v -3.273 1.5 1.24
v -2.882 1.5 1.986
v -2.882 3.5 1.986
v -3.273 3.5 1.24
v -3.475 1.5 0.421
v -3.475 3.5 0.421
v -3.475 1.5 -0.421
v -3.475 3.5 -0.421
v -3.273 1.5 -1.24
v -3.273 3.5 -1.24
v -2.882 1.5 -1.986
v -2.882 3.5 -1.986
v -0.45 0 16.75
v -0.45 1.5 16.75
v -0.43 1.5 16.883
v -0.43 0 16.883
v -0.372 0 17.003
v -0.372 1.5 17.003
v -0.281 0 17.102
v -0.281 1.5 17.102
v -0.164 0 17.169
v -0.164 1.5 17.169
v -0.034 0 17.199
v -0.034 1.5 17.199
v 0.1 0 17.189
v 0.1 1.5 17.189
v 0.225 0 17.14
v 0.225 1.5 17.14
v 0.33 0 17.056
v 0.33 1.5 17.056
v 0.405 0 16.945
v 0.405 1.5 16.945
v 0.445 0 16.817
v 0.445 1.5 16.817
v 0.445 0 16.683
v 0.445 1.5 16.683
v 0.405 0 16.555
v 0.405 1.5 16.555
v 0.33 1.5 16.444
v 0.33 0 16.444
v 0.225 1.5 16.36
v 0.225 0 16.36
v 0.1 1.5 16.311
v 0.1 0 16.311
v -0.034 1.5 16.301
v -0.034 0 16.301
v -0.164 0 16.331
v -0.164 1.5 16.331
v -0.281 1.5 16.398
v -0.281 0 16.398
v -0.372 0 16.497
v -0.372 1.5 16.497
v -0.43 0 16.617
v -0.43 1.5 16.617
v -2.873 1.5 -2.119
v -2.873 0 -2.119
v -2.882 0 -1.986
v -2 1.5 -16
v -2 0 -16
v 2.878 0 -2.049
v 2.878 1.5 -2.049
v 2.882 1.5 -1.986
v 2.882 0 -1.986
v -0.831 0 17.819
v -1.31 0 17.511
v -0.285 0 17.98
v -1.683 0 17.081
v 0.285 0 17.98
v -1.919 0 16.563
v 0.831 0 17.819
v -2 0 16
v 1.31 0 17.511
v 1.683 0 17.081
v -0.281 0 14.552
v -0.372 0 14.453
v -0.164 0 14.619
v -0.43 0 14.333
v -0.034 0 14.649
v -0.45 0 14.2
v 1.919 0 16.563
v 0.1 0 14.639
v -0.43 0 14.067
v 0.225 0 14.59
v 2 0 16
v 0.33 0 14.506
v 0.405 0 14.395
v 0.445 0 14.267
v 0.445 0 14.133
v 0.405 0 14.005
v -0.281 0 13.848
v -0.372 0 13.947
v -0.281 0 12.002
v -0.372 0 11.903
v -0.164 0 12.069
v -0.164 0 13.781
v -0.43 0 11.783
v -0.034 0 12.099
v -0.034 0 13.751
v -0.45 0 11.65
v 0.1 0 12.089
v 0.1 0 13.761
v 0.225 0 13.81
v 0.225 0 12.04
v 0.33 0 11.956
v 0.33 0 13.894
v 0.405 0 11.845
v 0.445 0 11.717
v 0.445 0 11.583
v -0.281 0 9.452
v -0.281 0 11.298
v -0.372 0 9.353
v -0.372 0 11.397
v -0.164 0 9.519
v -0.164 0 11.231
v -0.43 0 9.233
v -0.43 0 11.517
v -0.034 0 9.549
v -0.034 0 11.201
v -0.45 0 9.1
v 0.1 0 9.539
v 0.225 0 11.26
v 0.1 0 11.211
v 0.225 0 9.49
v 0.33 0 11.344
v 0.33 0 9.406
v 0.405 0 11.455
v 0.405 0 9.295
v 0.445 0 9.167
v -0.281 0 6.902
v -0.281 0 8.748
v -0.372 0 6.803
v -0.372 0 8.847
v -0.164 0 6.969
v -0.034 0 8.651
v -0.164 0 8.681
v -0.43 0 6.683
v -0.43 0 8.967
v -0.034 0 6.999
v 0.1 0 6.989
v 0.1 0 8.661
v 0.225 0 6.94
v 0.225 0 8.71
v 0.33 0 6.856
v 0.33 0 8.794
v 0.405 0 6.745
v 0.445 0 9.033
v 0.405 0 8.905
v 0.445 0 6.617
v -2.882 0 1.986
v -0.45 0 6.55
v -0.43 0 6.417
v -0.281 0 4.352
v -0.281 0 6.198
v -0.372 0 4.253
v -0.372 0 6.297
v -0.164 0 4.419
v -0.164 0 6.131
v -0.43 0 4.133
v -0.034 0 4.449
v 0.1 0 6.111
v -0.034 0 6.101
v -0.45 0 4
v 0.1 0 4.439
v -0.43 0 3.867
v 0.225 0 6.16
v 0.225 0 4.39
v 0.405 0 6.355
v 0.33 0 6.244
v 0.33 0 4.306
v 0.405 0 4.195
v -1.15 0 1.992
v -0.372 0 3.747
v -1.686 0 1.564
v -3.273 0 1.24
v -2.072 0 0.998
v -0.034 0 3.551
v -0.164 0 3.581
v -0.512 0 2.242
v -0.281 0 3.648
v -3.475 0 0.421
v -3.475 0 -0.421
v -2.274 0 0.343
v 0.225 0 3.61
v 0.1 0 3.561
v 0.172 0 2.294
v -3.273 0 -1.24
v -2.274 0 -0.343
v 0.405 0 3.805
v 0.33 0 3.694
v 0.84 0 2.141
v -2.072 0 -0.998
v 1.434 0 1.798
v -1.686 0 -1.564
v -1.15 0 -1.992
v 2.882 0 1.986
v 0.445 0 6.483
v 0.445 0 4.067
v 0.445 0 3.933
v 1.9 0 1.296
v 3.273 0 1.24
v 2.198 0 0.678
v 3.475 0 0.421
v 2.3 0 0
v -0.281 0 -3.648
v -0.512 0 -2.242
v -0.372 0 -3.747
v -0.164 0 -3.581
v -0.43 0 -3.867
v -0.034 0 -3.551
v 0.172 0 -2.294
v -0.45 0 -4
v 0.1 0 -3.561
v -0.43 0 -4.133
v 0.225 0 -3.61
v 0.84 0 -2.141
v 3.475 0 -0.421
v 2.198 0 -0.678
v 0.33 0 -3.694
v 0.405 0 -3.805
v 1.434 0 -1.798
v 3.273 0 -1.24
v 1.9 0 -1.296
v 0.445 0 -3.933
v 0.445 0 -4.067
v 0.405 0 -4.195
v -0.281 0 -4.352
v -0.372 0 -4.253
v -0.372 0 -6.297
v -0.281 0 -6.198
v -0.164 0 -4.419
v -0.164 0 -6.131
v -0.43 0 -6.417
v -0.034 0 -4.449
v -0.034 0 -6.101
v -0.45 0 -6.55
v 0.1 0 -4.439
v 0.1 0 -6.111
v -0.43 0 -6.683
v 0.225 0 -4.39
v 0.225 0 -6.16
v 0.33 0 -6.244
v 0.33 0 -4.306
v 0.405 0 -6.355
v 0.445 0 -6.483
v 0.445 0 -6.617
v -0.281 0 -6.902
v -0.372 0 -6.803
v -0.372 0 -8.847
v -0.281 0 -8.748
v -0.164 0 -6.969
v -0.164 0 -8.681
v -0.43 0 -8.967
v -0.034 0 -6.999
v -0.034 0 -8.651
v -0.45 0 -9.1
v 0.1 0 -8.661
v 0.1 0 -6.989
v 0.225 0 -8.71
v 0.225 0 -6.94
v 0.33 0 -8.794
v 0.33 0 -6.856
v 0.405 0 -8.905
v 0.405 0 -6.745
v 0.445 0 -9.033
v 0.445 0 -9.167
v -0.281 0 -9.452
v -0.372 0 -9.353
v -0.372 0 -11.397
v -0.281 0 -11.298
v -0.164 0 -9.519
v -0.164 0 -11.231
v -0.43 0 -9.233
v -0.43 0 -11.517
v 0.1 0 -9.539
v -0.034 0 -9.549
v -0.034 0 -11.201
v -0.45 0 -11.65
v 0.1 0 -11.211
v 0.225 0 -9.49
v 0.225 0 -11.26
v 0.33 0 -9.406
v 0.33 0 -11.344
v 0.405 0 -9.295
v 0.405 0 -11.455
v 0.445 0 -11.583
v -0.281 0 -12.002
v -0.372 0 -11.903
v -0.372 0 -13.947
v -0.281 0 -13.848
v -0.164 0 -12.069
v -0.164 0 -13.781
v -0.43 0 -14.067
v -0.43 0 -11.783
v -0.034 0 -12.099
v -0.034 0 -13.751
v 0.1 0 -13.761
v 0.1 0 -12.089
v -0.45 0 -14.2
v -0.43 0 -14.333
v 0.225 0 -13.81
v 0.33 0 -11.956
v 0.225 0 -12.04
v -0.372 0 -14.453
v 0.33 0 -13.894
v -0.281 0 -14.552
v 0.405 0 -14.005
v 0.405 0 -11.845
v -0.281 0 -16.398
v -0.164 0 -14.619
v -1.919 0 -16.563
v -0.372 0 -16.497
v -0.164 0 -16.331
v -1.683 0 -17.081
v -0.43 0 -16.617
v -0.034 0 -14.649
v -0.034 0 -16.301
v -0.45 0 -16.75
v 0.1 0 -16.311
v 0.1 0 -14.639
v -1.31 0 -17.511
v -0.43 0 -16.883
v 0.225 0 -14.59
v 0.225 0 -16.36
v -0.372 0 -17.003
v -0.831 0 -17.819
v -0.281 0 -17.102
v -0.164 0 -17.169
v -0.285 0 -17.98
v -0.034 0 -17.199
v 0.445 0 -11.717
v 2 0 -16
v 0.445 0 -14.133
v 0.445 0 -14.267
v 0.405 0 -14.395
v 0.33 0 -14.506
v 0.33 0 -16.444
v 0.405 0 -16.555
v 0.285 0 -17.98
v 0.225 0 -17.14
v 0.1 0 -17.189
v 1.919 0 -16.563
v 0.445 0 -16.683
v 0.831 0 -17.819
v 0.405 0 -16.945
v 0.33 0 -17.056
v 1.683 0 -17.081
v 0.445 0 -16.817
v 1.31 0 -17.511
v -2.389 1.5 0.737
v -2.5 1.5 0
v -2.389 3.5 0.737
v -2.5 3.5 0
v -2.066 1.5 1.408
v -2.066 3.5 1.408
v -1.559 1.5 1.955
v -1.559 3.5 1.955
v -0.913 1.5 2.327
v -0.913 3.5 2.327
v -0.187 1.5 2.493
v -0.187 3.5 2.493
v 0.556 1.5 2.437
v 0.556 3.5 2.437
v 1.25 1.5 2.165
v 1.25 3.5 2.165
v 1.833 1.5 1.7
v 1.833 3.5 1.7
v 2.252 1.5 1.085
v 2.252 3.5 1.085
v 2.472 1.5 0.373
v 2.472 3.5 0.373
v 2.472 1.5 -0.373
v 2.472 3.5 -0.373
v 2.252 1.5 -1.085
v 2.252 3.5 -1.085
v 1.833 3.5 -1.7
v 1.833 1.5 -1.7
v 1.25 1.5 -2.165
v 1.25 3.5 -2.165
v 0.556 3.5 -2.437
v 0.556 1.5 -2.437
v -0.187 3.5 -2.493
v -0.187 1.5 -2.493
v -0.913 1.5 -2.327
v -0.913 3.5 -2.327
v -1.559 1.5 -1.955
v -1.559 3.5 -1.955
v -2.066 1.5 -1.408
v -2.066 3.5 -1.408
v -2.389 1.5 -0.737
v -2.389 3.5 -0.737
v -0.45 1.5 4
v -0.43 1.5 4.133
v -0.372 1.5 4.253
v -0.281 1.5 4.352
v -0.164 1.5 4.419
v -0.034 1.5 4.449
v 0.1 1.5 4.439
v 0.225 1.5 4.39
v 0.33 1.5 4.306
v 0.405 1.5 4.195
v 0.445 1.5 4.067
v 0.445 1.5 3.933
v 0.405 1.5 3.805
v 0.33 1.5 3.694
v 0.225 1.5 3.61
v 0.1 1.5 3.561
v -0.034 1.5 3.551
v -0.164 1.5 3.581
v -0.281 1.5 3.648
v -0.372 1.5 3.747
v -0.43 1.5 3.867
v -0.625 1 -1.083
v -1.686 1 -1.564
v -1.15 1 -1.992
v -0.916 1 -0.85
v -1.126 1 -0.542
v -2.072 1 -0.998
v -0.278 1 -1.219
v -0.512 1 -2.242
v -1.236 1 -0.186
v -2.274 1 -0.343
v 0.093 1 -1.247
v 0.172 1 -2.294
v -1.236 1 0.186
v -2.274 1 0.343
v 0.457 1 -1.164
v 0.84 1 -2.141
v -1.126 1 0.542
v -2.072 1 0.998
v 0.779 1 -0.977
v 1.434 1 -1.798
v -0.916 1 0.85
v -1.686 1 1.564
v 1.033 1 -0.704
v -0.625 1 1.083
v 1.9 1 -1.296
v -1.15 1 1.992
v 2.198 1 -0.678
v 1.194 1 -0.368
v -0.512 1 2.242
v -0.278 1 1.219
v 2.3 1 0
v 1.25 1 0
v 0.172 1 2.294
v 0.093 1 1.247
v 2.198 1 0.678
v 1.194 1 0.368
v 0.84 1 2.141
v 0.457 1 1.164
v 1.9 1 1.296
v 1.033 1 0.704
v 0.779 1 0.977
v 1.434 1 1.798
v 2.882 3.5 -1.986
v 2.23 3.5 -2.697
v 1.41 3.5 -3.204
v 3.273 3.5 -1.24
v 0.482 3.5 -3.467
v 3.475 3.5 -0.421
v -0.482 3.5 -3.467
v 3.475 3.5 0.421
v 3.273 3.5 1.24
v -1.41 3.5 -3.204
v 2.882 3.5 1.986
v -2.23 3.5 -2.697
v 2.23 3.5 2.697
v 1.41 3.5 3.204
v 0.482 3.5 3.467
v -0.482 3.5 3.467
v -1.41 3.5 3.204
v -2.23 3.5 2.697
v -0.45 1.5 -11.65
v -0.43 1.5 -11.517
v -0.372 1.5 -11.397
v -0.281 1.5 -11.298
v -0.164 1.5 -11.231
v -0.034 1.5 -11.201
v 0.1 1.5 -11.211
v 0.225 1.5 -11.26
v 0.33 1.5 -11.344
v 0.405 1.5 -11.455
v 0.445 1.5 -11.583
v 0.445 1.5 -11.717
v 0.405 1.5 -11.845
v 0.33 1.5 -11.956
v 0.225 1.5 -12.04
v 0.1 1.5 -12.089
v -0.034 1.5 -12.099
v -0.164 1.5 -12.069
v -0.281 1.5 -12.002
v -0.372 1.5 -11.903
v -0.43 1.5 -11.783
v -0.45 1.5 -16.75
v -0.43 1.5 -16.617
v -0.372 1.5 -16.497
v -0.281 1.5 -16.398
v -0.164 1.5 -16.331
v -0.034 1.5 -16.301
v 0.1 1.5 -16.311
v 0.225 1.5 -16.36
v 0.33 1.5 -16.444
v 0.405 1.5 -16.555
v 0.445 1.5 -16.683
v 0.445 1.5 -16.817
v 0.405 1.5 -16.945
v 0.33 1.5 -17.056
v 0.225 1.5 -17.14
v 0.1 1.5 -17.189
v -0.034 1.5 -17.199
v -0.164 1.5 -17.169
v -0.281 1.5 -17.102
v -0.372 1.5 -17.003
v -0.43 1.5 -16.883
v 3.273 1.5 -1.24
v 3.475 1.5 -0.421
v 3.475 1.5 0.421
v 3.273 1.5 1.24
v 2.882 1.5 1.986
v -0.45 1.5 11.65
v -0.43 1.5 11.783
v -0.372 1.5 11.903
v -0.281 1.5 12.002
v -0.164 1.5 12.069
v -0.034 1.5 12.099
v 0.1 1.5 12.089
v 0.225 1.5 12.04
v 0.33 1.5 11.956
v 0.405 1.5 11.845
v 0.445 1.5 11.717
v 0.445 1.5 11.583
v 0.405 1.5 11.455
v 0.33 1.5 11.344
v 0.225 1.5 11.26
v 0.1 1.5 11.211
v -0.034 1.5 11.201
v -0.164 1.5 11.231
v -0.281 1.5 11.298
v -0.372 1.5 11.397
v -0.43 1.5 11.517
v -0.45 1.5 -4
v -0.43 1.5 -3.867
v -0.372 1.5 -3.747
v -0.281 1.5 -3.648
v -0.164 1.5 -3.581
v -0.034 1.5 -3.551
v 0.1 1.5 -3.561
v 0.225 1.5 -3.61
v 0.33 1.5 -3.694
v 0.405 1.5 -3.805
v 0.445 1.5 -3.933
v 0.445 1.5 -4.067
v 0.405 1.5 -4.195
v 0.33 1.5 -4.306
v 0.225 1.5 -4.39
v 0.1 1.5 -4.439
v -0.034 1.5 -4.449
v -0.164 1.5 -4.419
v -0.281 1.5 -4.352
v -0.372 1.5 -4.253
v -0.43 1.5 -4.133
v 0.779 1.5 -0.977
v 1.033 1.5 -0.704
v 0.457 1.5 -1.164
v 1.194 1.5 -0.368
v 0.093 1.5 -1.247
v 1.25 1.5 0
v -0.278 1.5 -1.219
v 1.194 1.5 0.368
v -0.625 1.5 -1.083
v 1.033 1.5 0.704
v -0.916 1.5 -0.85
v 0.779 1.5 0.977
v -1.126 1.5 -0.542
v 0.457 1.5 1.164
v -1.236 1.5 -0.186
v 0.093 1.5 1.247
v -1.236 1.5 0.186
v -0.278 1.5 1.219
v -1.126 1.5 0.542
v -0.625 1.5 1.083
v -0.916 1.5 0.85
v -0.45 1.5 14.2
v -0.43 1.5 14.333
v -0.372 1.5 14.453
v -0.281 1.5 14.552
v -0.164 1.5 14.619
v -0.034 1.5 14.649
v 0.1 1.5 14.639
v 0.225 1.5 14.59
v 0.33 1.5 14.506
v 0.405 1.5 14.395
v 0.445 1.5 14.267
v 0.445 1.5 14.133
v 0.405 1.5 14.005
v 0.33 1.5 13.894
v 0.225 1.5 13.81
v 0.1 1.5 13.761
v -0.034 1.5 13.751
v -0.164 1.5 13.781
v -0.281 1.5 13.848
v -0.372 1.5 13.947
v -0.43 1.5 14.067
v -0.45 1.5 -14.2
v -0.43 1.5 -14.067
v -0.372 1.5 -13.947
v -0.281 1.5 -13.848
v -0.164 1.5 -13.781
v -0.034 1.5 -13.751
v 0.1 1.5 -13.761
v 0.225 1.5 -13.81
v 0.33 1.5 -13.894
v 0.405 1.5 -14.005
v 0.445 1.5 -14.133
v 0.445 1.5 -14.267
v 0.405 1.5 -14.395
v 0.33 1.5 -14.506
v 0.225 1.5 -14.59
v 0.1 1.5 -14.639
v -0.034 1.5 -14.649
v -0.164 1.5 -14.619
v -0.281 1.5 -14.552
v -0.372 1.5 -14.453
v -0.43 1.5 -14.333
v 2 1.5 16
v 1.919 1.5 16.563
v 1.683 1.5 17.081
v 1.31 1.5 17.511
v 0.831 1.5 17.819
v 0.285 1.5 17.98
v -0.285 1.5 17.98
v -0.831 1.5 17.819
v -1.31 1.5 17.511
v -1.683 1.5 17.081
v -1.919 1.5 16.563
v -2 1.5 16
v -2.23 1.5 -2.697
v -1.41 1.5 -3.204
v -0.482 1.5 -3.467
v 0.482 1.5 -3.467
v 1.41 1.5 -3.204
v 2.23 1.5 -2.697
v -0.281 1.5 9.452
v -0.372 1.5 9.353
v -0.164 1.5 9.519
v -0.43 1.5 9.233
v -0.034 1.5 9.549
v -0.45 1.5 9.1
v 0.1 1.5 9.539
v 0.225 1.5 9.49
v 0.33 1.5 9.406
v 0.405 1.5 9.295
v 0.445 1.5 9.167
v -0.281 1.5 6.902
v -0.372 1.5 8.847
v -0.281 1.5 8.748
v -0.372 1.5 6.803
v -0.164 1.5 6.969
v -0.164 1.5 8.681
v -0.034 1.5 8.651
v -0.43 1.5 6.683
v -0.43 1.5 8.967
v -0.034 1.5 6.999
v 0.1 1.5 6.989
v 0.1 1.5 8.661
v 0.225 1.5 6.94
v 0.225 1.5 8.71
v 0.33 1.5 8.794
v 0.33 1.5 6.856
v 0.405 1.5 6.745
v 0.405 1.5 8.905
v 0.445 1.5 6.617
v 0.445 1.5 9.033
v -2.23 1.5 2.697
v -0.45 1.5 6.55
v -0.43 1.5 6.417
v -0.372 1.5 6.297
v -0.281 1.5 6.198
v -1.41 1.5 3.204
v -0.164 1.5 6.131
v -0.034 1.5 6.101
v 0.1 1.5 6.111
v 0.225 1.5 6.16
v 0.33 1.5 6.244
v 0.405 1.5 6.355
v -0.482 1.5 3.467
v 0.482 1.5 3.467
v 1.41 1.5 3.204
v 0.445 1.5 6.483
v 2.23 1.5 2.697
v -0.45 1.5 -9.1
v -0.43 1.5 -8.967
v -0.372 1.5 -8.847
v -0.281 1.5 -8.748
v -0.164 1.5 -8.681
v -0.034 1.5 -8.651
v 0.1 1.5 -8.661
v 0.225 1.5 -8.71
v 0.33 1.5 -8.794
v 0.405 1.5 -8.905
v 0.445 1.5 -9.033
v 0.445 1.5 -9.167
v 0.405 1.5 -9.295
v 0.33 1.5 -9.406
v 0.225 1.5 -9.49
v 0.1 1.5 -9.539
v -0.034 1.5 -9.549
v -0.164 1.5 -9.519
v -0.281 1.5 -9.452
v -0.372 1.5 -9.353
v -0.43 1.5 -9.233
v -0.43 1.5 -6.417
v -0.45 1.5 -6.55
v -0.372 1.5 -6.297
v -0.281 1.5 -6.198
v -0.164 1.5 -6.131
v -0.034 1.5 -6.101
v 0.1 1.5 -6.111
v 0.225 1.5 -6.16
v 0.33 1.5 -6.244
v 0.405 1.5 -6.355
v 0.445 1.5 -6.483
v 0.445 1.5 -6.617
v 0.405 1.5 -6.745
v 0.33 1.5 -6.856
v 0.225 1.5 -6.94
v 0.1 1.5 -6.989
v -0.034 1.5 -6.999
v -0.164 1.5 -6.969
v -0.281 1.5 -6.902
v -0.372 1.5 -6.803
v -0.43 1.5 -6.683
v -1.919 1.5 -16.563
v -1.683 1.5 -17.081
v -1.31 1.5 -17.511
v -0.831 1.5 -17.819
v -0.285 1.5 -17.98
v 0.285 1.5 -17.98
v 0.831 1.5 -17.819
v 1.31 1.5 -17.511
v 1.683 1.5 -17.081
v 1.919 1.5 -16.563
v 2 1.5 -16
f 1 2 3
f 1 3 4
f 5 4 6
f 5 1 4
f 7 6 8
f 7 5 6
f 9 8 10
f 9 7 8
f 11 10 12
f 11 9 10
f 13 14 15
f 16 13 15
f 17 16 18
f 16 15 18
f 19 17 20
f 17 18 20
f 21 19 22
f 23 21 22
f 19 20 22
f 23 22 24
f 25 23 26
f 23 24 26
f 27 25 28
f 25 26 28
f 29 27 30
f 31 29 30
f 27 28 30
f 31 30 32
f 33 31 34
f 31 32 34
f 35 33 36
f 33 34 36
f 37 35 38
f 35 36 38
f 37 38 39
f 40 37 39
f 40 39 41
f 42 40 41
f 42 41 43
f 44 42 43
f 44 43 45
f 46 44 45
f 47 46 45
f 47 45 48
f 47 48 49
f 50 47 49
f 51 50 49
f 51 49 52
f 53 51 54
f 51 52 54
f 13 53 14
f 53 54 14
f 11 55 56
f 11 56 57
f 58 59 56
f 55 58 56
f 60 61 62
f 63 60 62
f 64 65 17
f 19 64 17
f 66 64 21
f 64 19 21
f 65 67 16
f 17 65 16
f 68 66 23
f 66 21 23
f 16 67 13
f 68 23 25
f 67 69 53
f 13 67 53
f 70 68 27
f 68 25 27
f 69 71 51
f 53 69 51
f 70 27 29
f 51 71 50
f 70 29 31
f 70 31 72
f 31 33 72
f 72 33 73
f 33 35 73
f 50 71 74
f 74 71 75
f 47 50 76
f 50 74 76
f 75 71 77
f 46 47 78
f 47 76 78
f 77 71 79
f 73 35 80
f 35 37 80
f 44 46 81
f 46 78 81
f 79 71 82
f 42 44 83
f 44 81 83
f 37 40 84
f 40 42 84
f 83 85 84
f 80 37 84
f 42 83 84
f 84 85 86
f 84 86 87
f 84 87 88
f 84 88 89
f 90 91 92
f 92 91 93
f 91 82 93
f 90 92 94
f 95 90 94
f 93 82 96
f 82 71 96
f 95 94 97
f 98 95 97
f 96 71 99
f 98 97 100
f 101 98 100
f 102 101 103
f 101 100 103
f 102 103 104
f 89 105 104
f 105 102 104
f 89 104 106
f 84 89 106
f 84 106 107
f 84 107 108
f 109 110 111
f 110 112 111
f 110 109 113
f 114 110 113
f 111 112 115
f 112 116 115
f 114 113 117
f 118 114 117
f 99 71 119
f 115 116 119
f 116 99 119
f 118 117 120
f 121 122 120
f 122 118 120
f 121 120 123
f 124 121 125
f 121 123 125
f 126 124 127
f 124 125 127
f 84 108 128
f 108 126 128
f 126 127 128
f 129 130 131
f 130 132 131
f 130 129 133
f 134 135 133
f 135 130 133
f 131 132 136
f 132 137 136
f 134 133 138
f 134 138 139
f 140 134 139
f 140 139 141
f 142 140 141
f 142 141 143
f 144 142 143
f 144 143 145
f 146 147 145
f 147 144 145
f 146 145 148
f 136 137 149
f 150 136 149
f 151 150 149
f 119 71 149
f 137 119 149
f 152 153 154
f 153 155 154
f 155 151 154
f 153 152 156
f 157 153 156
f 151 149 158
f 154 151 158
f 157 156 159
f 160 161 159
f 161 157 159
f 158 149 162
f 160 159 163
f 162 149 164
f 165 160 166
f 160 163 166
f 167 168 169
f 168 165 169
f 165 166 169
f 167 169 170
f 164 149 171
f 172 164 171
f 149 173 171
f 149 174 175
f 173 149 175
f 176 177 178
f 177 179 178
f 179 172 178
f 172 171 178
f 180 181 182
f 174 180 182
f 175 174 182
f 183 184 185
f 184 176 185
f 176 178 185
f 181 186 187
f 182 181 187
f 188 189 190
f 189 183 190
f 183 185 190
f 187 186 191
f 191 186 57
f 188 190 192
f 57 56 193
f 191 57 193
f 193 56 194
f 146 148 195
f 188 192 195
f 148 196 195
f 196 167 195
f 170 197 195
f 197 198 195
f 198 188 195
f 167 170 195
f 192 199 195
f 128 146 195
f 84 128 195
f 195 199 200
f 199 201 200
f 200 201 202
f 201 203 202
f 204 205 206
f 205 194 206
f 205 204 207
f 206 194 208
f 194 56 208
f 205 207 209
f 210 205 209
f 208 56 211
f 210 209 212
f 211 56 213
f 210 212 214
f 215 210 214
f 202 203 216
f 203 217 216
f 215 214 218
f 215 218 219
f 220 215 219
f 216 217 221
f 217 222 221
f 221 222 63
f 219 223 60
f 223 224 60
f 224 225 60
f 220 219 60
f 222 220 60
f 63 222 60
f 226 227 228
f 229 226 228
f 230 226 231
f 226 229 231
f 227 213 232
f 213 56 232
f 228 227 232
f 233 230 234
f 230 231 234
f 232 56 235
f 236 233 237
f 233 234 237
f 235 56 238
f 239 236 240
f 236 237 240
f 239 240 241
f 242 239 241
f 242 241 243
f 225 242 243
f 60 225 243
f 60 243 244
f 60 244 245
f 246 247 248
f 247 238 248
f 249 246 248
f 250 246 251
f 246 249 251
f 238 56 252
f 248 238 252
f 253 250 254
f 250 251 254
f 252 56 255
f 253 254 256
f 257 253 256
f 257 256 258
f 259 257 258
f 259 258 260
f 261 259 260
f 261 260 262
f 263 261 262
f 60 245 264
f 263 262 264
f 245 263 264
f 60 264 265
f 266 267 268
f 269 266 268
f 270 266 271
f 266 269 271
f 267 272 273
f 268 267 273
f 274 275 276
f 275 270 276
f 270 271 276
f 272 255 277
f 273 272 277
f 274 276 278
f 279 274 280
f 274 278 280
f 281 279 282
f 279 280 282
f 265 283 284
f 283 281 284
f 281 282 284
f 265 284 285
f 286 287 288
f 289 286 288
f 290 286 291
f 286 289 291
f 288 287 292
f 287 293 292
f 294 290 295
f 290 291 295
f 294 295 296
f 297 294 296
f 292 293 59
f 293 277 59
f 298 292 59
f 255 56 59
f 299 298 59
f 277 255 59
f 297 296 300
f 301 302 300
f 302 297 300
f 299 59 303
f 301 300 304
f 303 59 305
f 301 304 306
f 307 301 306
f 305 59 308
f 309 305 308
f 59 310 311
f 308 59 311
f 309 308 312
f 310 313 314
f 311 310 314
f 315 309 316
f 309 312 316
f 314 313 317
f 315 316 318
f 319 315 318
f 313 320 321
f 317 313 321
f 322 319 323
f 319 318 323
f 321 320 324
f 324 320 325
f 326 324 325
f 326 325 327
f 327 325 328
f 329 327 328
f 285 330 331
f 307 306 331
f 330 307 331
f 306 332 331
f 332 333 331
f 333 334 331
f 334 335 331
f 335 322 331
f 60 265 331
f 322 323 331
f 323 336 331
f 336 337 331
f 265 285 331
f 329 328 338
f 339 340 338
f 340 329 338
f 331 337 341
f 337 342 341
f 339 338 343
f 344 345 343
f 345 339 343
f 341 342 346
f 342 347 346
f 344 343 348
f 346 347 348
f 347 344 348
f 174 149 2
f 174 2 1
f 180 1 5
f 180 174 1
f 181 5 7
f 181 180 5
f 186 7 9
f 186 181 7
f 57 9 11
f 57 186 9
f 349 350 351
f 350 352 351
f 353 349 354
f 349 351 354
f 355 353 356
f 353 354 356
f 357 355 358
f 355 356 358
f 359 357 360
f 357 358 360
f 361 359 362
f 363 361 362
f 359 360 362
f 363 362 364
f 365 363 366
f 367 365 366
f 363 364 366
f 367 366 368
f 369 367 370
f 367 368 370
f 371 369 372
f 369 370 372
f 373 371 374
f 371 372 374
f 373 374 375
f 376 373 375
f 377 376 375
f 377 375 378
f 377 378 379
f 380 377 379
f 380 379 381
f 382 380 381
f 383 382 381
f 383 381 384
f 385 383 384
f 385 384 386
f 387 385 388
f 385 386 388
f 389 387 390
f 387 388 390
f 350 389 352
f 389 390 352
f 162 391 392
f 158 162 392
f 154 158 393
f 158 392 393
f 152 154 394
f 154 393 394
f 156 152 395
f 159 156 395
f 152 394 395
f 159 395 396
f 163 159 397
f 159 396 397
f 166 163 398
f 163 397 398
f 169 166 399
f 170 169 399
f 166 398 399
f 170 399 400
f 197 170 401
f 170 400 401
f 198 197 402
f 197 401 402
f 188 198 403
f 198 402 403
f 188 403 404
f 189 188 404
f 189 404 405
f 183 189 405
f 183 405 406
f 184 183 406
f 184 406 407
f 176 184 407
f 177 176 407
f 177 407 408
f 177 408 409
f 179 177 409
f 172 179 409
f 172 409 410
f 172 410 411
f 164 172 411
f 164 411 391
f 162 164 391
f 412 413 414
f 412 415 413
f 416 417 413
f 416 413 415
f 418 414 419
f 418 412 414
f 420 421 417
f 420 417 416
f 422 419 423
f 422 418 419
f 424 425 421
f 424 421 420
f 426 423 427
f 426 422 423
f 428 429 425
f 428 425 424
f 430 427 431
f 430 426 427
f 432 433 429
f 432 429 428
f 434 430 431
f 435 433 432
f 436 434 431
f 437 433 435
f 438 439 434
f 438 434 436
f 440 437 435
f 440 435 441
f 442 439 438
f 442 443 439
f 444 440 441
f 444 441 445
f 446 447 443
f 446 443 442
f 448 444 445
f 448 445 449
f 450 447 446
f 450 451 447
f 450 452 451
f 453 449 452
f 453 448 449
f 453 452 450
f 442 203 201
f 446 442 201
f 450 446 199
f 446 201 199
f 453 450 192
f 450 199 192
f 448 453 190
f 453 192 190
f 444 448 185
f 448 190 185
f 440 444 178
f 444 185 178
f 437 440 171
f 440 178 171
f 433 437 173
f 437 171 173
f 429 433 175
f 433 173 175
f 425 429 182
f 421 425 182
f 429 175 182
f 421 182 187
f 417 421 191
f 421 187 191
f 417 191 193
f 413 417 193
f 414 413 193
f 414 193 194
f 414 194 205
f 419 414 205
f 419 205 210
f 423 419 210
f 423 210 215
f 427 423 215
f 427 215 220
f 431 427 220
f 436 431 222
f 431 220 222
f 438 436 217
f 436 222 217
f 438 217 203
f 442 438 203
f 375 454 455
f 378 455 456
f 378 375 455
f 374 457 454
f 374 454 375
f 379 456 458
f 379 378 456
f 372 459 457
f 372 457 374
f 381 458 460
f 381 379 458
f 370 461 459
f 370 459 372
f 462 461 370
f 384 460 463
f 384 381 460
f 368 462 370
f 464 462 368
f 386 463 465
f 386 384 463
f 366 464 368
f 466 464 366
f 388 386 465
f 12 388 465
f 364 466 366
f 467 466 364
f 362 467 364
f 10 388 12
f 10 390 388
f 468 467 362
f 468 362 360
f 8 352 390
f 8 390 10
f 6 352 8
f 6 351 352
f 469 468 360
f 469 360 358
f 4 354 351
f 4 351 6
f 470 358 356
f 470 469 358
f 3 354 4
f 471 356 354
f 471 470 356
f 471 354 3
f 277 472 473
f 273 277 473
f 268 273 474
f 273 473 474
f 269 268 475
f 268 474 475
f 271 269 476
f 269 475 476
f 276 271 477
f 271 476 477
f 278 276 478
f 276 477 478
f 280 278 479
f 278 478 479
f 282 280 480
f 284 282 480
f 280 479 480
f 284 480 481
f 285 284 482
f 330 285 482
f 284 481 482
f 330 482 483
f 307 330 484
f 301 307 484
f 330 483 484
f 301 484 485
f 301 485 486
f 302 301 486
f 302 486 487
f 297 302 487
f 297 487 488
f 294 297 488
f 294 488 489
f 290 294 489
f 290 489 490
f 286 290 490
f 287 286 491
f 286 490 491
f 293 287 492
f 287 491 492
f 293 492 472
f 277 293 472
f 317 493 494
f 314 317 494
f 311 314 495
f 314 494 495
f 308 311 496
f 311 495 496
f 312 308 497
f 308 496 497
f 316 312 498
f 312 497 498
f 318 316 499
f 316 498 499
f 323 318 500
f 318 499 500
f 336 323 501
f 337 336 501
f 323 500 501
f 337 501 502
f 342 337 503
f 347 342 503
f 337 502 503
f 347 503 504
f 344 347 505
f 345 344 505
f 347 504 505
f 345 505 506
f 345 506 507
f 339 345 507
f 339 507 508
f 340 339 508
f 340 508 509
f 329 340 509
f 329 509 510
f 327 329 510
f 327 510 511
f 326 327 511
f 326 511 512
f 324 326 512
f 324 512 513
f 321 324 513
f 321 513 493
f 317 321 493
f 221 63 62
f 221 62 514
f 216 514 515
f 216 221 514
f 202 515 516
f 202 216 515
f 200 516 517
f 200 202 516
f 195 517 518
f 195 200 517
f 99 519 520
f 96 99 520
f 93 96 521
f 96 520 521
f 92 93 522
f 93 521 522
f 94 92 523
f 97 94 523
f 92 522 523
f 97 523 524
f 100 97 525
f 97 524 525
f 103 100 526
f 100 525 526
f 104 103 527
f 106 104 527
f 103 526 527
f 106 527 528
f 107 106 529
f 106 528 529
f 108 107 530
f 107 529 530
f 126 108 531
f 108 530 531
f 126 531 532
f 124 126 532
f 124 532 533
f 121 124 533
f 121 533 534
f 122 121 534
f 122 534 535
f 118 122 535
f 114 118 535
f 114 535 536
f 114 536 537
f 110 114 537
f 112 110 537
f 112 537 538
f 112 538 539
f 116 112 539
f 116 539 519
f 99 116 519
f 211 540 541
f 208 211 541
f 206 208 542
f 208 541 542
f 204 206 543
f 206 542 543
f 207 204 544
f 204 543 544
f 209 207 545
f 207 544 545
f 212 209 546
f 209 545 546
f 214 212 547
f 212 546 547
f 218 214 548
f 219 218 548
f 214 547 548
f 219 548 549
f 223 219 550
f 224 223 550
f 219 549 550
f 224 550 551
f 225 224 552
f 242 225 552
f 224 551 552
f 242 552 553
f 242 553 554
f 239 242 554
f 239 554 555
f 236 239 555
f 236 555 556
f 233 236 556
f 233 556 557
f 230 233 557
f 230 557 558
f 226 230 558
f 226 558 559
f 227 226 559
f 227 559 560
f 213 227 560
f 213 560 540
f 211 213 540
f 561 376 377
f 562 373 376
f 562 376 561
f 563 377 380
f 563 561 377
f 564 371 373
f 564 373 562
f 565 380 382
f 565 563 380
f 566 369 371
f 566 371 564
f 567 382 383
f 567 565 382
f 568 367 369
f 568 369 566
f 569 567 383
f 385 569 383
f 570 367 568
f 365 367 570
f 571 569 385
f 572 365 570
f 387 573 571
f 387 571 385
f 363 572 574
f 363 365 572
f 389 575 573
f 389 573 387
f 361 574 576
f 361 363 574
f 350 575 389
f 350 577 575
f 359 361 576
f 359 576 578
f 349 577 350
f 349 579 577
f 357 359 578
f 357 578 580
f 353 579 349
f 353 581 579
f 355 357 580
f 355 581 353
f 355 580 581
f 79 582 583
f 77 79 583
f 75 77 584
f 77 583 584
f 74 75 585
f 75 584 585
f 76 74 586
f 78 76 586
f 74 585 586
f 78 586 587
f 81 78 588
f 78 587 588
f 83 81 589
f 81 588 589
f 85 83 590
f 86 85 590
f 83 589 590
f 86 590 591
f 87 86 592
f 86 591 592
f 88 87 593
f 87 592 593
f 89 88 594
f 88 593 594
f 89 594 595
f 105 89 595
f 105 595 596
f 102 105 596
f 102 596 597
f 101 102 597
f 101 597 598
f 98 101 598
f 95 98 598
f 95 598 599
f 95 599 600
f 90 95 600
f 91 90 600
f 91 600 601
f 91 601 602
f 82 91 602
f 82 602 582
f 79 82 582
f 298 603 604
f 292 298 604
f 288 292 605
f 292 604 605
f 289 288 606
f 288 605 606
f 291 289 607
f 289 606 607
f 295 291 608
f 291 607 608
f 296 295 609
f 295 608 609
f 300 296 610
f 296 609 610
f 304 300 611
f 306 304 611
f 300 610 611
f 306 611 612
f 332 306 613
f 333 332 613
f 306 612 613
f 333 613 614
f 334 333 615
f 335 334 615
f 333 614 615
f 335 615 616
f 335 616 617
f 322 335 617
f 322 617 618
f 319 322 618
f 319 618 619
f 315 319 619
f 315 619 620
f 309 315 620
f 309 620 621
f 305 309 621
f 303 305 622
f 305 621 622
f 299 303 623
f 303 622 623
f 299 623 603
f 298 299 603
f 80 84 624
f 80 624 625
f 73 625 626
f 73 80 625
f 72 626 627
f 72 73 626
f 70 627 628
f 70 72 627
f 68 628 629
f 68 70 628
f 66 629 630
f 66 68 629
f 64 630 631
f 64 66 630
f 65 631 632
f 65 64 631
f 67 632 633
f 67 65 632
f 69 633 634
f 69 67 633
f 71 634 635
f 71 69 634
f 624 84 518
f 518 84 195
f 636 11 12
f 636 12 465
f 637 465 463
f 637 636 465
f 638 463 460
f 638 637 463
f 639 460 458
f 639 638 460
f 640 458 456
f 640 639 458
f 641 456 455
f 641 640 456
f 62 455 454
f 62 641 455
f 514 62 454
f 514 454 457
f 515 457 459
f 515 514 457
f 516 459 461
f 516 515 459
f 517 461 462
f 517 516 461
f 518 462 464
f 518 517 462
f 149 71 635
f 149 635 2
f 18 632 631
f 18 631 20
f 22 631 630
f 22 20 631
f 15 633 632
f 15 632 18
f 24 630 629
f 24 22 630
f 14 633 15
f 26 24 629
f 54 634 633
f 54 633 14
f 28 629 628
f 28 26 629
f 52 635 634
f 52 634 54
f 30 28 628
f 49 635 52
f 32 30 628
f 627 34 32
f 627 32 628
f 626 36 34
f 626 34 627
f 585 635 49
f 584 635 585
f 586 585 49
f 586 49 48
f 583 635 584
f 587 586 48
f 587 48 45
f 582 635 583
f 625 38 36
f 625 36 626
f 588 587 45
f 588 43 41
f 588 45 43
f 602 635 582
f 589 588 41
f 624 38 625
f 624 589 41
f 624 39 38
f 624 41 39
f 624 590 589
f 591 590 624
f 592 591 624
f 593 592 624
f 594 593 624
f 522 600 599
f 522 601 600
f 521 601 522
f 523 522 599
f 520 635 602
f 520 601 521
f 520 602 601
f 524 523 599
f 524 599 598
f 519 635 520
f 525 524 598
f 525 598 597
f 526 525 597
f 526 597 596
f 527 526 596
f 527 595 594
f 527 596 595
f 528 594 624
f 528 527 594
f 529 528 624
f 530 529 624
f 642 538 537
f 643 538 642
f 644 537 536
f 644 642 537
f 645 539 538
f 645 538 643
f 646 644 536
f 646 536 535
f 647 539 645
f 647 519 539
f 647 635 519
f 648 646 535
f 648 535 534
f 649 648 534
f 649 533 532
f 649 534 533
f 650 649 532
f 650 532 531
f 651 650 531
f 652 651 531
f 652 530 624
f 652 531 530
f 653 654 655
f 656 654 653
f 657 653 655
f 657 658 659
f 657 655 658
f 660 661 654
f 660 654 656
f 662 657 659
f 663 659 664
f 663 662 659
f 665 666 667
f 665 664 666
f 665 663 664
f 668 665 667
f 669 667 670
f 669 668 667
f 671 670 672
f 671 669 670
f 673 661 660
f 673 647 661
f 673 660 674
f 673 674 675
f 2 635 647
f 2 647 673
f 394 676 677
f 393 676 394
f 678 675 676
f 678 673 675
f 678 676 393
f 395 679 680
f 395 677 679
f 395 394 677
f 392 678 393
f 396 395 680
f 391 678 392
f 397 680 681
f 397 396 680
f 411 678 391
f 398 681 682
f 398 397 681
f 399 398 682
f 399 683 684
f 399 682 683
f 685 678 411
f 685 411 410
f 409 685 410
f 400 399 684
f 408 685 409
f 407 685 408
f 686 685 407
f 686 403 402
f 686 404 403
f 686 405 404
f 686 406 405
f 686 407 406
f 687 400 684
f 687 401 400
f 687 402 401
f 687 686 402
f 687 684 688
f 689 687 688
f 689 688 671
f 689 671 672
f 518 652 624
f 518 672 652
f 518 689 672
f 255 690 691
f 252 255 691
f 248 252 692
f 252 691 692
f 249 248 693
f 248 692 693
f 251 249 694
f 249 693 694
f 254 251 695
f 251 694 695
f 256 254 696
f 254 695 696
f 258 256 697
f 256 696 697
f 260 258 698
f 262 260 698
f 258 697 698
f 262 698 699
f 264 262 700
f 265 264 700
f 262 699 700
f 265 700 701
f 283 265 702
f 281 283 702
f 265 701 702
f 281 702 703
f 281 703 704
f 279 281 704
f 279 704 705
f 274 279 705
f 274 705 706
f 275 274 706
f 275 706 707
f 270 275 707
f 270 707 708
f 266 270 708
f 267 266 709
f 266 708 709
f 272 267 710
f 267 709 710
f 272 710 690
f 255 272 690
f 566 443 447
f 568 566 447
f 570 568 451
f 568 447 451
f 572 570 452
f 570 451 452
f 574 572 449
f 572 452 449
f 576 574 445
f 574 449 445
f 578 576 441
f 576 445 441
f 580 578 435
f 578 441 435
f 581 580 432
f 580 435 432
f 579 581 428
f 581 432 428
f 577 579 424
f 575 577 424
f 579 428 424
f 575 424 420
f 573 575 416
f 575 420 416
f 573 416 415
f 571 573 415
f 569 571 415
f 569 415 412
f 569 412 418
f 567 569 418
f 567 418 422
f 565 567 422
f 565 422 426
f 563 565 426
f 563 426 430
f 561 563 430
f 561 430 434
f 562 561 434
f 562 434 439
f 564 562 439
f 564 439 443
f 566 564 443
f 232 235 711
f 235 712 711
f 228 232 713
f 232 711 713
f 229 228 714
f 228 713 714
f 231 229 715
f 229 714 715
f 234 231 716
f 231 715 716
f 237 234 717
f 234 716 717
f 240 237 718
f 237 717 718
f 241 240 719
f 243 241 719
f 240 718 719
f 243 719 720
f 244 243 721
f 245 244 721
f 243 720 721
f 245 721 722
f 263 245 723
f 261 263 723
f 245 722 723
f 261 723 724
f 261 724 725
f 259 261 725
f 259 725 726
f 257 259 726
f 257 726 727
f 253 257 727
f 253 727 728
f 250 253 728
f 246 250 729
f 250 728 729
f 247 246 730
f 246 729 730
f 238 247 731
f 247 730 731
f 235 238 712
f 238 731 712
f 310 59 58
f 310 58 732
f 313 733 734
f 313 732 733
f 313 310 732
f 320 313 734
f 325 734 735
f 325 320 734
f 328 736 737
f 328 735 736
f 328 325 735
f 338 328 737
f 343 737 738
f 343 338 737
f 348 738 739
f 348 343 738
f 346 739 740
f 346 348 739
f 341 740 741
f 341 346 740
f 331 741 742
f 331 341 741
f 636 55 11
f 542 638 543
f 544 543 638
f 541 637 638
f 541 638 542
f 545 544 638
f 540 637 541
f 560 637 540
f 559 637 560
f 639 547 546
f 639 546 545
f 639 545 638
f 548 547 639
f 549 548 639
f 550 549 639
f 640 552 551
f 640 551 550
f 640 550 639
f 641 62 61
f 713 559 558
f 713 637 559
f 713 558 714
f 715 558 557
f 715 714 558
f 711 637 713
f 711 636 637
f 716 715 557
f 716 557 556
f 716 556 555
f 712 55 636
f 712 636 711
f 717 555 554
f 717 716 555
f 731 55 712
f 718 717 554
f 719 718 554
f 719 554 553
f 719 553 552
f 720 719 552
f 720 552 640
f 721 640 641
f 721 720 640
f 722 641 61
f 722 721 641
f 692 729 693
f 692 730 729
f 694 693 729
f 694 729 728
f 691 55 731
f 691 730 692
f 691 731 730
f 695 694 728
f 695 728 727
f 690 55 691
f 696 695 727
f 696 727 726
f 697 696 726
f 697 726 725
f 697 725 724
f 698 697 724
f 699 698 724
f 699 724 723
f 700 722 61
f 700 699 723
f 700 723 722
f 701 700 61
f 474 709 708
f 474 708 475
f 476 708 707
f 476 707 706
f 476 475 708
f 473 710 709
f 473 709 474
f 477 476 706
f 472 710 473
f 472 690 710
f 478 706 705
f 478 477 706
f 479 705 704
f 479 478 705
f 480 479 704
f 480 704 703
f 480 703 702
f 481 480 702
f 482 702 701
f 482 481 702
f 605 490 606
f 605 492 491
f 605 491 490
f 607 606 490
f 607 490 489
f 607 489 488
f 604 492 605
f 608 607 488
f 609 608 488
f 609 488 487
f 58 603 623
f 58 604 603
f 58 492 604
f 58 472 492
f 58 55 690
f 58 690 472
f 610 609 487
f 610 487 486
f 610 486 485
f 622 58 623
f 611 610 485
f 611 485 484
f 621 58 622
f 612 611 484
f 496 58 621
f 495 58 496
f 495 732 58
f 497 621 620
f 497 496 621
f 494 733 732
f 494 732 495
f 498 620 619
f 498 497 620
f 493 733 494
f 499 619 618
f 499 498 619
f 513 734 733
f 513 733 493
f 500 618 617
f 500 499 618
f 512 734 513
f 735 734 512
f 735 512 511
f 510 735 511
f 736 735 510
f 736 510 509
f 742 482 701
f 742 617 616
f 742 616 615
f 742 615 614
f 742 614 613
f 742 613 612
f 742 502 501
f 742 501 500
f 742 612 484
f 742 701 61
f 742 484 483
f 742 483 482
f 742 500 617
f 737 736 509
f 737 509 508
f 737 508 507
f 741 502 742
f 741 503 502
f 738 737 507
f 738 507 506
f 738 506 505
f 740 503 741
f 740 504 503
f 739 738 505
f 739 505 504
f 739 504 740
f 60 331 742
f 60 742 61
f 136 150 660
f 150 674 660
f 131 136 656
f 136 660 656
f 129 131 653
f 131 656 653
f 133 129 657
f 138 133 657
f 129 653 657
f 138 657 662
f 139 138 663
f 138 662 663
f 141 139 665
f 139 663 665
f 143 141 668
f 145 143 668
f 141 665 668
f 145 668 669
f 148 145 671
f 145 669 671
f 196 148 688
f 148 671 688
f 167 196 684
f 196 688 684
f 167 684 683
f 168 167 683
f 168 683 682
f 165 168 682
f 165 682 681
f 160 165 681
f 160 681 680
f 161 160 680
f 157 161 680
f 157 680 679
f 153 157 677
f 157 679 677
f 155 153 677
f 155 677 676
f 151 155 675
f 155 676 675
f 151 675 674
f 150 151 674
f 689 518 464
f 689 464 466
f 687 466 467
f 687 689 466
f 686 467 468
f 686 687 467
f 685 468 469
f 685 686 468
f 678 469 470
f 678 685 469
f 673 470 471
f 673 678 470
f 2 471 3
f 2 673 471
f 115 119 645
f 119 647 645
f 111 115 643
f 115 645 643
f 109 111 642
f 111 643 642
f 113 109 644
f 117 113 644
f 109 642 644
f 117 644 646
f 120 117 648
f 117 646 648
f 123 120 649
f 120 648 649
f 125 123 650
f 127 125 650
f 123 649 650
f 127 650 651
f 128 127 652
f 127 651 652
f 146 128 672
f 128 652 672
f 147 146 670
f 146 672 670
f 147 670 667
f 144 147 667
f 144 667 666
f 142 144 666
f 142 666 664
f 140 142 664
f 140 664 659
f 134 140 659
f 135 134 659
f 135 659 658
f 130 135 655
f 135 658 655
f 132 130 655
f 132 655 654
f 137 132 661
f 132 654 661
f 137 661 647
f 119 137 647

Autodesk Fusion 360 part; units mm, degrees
sketch "草图1" plane through (0, 0, 0) normal (0, 1, 0) x (1, 0, 0)
  circle A0 centre (0, 0) radius 3.5
  line L0 (0, 0) -> (0, -16)
  line L1 (0, 0) -> (0, 16)
  circle A1 centre (0, -16) radius 2
  circle A2 centre (0, 16) radius 2
  line L2 (0, 16) -> (6, 16)
  line L3 (6, 16) -> (-7, 16)
  line L4 (2, 16) -> (2.8777, 2.0488)
  line L5 (2, 16) -> (15.9788, 16) construction
  line L6 (-2, 16) -> (-2.8733, 2.1192)
  line L7 (-2, 16) -> (11.9083, 16) construction
  line L8 (0, -16) -> (5, -16)
  line L9 (5, -16) -> (-6, -16)
  line L10 (2, -16) -> (2.8901, -1.8524)
  line L11 (2, -16) -> (16.1756, -16) construction
  line L12 (-2, -16) -> (-2.8817, -1.9865)
  line L13 (-2, -16) -> (12.0412, -16) construction
  line L14 (2.8777, 2.0488) -> (2.8885, 1.8784)
  line L15 (-2.8733, 2.1192) -> (-2.9, 1.6952)
  dimension "d1" = 7
  dimension "d2" = 16
  dimension "d3" = 16
  dimension "d4" = 4
  dimension "d5" = 4
  dimension "d6" = 86.4
  dimension "d7" = 93.6
  dimension "d8" = 13.9083
  dimension "d9" = 86.4
  dimension "d10" = 93.6
extrude "拉伸1" add sketch "草图1" along normal blind 1.5
sketch "草图2" plane through (0, 1.5, 0) normal (0, 1, 0) x (-1, 0, 0)
  arc A0 (-2, -16) -> (2, -16) centre (0, -16) ccw
  line L0 (2, -16) -> (2.8817, -1.9865)
  arc A1 (2.8817, -1.9865) -> (2.8817, 1.9865) centre (0, 0) ccw
  line L1 (2.8817, 1.9865) -> (2, 16)
  arc A2 (2, 16) -> (-2, 16) centre (0, 16) ccw
  line L2 (-2, 16) -> (-2.8817, 1.9865)
  arc A3 (-2.8817, 1.9865) -> (-2.8817, -1.9865) centre (0, 0) ccw
  line L3 (-2.8817, -1.9865) -> (-2, -16)
  circle A4 centre (0, 0) radius 3.5
extrude "拉伸2" add sketch "草图2" along normal blind 2 contours A1 A3 A4
sketch "草图3" plane through (0, 1.5, 0) normal (0, 1, 0) x (-1, 0, 0)
  arc A0 (-2.8817, -1.9865) -> (2.8817, -1.9865) centre (0, 0) ccw
  line L0 (-2.8817, -1.9865) -> (-2, -16)
  arc A1 (-2, -16) -> (2, -16) centre (0, -16) ccw
  line L1 (2, -16) -> (2.8817, -1.9865)
  line L2 (0, -4) -> (0, -16.75)
  line L3 (0, -16.75) -> (0, -14.2)
  line L4 (0, -14.2) -> (0, -11.65)
  line L5 (0, -11.65) -> (0, -9.1)
  line L6 (0, -9.1) -> (0, -6.55)
  circle A2 centre (0, -4) radius 0.45
  circle A3 centre (0, -16.75) radius 0.45
  circle A4 centre (0, -14.2) radius 0.45
  circle A5 centre (0, -11.65) radius 0.45
  circle A6 centre (0, -9.1) radius 0.45
  circle A7 centre (0, -6.55) radius 0.45
  line L7 (-8.6176, 0) -> (8, 0)
  circle A8 centre (0, 16.75) radius 0.45
  circle A9 centre (0, 14.2) radius 0.45
  circle A10 centre (0, 11.65) radius 0.45
  circle A11 centre (0, 9.1) radius 0.45
  circle A12 centre (0, 6.55) radius 0.45
  circle A13 centre (0, 4) radius 0.45
  dimension "d26" = 12.75
  dimension "d28" = 2.55
  dimension "d29" = 2.55
  dimension "d30" = 2.55
  dimension "d31" = 2.55
  dimension "d32" = 0.9
  dimension "d33" = 0.9
  dimension "d34" = 0.9
  dimension "d35" = 0.9
  dimension "d36" = 0.9
  dimension "d37" = 0.9
extrude "拉伸3" cut sketch "草图3" against normal blind 8 contours A3 | L2 L3 L4 A4 | L2 L3 L4 A4 | L2 L4 L5 A5 | L2 L4 L5 A5 | L2 L5 L6 A6 | L2 L5 L6 A6 | L2 L6 A7 | L2 L6 A7 | A2 | A8 | A9 | A10 | A11 | A12 | A13
sketch "草图4" plane through (0, 0, 0) normal (0, -1, 0) x (1, 0, 0)
  circle A0 centre (0, 11.65) radius 0.45
  circle A1 centre (0, -4) radius 0.45
  circle A2 centre (0, -14.2) radius 0.45
  circle A3 centre (0, -11.65) radius 0.45
  circle A4 centre (0, 4) radius 0.45
  circle A5 centre (0, 14.2) radius 0.45
  circle A6 centre (0, 9.1) radius 0.45
  circle A7 centre (0, -6.55) radius 0.45
  circle A8 centre (0, -16.75) radius 0.45
  circle A9 centre (0, -9.1) radius 0.45
  circle A10 centre (0, 6.55) radius 0.45
  circle A11 centre (0, 16.75) radius 0.45
  arc A12 (-2, -16) -> (2, -16) centre (0, -16) ccw
  line L0 (2, -16) -> (2.8817, -1.9865)
  arc A13 (2.8817, -1.9865) -> (2.8817, 1.9865) centre (0, 0) ccw
  line L1 (2.8817, 1.9865) -> (2, 16)
  arc A14 (2, 16) -> (-2, 16) centre (0, 16) ccw
  line L2 (-2, 16) -> (-2.8817, 1.9865)
  arc A15 (-2.8817, 1.9865) -> (-2.8817, -1.9865) centre (0, 0) ccw
  line L3 (-2.8817, -1.9865) -> (-2, -16)
  circle A16 centre (0, 0) radius 2.3
  dimension "d40" = 4.6
extrude "拉伸4" cut sketch "草图4" against normal blind 1 contours A16
sketch "草图5" plane through (0, 1, 0) normal (0, -1, 0) x (1, 0, 0)
  circle A0 centre (0, 0) radius 2.3
  circle A1 centre (0, 0) radius 1.25
  dimension "d43" = 2.5
extrude "拉伸5" cut sketch "草图5" against normal blind 10 contours A1
sketch "草图6" plane through (0, 3.5, 0) normal (0, 1, 0) x (-1, 0, 0)
  circle A0 centre (0, 0) radius 1.25
  circle A1 centre (0, 0) radius 3.5
  circle A2 centre (0, 0) radius 2.5
  dimension "d46" = 5
extrude "拉伸6" cut sketch "草图6" against normal blind 2 contours A2
